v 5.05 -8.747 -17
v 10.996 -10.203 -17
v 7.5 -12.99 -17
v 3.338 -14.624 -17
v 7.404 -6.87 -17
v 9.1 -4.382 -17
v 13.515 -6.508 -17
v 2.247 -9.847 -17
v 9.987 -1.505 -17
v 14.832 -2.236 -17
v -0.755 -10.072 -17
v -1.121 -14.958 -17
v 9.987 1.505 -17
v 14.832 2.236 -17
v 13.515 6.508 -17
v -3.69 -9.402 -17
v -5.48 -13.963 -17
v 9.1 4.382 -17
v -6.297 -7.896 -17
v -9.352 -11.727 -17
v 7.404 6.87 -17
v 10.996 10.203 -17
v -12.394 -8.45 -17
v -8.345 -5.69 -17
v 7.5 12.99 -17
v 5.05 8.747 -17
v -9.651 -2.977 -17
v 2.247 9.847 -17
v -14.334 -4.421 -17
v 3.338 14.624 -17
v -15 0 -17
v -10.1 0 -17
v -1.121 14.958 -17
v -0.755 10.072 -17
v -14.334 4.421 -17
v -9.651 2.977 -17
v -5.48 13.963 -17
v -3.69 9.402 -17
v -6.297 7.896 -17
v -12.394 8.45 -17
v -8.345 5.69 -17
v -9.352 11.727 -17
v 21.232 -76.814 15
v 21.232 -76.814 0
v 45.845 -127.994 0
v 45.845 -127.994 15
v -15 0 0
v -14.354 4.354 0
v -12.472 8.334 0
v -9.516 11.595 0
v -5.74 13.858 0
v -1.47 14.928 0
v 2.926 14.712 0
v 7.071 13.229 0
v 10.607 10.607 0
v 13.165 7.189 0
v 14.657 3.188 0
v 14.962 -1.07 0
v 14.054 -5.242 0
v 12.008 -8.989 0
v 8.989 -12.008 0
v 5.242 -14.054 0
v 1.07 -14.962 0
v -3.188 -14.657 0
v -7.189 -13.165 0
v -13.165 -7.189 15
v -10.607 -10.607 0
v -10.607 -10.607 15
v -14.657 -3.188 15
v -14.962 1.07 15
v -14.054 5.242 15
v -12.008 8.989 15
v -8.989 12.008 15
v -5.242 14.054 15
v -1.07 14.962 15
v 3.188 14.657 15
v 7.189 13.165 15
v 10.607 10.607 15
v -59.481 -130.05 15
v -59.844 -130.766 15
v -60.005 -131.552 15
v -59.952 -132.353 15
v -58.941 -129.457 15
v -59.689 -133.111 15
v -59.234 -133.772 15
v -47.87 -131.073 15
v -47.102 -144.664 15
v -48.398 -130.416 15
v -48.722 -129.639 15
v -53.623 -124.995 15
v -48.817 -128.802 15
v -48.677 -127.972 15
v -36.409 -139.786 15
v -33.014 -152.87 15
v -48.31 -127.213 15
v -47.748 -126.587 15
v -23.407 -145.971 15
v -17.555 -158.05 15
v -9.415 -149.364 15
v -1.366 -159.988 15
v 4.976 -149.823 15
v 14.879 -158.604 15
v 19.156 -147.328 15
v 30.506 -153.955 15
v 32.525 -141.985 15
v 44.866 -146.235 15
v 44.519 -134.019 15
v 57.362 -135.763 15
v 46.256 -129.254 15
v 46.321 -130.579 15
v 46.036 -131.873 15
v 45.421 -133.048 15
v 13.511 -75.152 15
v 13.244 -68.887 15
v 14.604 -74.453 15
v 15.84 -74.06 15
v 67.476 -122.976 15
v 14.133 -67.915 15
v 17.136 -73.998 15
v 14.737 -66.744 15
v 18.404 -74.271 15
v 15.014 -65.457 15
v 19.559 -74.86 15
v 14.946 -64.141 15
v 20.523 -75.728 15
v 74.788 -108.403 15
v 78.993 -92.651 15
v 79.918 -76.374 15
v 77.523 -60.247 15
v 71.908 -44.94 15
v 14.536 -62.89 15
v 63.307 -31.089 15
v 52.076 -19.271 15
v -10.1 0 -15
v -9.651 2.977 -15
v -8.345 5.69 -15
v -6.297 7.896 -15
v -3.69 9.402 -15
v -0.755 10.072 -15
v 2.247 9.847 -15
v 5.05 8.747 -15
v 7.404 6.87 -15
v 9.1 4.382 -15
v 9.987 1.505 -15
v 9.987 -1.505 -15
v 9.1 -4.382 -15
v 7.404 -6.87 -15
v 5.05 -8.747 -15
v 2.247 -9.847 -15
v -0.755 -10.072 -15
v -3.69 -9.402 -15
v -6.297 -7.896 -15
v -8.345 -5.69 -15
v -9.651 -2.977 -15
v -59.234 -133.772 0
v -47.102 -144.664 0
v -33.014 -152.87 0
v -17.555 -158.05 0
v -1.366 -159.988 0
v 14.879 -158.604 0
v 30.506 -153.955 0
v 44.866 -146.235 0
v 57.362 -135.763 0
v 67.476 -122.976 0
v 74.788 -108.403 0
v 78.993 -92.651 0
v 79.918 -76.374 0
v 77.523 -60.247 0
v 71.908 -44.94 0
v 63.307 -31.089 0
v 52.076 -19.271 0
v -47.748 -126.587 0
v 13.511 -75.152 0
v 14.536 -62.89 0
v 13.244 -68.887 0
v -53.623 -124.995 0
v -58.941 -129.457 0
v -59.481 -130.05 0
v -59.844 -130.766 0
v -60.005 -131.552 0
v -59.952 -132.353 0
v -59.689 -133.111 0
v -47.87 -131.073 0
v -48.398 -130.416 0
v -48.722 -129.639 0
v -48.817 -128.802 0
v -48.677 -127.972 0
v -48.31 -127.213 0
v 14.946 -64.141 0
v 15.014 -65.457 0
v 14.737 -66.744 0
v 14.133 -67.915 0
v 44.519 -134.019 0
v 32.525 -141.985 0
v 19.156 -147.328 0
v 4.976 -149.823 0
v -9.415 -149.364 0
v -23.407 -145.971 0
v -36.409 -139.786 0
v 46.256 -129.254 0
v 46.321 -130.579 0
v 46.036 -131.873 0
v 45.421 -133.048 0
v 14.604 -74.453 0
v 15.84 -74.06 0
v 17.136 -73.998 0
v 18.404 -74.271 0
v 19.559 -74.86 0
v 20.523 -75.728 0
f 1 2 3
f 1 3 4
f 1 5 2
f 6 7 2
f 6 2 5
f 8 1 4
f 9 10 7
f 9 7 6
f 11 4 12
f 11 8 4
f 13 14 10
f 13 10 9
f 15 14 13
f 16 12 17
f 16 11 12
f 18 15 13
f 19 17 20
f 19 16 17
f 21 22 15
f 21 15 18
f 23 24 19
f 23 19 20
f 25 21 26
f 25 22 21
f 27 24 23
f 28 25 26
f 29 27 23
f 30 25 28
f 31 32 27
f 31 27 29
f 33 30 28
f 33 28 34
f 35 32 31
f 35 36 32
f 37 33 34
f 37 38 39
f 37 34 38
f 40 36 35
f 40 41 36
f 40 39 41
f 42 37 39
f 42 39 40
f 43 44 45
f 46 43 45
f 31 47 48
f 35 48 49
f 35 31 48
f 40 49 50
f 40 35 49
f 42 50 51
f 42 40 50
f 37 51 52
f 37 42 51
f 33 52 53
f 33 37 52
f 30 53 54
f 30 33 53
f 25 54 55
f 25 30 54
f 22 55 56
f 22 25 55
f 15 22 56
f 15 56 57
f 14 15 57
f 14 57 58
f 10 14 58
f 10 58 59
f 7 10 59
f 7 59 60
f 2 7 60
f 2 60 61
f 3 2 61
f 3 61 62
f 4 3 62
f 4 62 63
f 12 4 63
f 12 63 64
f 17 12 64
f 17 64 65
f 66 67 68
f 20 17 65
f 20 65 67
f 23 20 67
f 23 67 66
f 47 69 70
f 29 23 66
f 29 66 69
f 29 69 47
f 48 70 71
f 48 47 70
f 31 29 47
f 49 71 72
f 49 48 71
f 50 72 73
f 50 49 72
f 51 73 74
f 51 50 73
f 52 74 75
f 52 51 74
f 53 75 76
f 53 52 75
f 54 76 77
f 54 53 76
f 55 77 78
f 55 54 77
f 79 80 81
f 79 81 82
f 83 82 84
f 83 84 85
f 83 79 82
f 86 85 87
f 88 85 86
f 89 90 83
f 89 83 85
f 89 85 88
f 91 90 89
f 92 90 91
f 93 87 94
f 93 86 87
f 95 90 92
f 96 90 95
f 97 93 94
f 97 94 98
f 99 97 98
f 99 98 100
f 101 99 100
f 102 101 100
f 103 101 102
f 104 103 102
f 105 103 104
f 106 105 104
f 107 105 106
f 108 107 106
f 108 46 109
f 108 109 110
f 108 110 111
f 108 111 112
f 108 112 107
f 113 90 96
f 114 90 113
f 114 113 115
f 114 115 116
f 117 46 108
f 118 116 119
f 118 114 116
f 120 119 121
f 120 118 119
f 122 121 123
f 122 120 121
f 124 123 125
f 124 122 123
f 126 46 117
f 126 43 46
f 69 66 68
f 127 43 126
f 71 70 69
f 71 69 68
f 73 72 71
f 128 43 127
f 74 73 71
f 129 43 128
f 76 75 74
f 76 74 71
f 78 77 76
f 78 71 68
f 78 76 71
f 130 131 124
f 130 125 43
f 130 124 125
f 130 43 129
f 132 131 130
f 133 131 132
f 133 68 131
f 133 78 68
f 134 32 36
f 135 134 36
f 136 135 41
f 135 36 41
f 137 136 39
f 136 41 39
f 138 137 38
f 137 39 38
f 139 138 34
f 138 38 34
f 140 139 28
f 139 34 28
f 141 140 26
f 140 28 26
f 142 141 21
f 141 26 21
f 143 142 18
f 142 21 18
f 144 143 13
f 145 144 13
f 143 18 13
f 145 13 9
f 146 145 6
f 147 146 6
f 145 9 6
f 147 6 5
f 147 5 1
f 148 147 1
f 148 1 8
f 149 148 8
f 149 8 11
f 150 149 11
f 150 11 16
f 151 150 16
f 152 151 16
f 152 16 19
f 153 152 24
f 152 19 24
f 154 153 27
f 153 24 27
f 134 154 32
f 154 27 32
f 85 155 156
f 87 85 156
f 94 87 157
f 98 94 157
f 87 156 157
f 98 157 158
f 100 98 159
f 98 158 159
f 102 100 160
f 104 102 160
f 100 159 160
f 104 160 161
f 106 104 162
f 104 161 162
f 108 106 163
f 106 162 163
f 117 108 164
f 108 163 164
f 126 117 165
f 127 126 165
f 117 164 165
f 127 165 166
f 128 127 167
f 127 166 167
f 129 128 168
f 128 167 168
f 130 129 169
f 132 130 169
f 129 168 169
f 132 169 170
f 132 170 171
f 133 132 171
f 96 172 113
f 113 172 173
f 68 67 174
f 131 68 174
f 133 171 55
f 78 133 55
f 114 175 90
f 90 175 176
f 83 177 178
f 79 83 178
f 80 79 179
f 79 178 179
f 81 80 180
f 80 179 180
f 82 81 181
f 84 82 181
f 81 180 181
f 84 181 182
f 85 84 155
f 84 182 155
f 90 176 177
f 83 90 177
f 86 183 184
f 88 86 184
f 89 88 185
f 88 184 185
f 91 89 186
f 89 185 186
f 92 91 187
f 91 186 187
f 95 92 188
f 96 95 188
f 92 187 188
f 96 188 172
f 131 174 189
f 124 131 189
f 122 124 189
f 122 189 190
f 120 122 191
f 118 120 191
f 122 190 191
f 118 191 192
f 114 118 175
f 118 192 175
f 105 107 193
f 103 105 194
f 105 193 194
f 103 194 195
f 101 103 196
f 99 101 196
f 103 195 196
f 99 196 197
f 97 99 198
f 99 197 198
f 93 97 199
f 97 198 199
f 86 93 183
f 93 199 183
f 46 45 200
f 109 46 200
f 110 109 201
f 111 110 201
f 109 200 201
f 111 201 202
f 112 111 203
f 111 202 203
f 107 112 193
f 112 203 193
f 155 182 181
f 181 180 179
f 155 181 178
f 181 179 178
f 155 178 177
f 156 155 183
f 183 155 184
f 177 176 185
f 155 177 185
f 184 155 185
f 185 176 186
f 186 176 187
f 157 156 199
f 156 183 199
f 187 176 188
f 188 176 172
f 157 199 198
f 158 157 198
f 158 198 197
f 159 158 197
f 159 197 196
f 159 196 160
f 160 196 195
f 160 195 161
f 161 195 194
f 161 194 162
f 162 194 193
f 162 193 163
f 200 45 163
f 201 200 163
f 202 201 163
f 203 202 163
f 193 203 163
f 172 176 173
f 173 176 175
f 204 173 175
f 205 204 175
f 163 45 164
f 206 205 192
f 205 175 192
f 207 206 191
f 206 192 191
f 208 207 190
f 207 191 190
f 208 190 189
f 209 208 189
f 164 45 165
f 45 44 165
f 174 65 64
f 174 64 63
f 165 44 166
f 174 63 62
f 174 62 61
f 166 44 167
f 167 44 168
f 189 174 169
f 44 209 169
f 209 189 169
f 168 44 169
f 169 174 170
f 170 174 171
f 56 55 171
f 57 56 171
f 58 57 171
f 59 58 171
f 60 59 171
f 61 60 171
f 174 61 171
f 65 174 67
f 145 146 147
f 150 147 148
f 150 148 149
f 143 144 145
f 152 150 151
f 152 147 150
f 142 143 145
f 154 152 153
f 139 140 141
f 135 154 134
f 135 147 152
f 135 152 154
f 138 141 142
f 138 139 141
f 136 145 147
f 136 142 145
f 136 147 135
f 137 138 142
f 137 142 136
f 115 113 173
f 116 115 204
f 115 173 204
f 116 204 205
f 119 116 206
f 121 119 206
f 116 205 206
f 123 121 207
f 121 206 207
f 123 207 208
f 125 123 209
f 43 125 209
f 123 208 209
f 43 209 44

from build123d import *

# Parameters (mm, degrees)
EXTRUDE_1_DEPTH     = 15
EXTRUDE_START       = 17
SKETCH_9_R          = 15
EXTRUDE_3_DEPTH     = 17
SKETCH_10_R         = 10.1
CUT_EXTRUDE_4_DEPTH = 2


with BuildPart() as part:
    # ｽｹｯﾁ4 → ﾎﾞｽ - 押し出し1 (new body)
    with BuildSketch(Plane.XY):
        with BuildLine():
            Line((-53.623111018, -124.995132678), (-58.940636287, -129.45706617))
            ThreePointArc((-58.940636287, -129.45706617), (-60.005384698, -131.552012131), (-59.233530865, -133.771635843))
            ThreePointArc((-59.233530865, -133.771635843), (57.362306223, -135.763481103), (52.076178918, -19.270504783))
            Line((52.076178918, -19.270504783), (10.606601718, 10.606601718))
            ThreePointArc((10.606601718, 10.606601718), (-10.606601718, 10.606601718), (-10.606601718, -10.606601718))
            Line((-10.606601718, -10.606601718), (14.536280154, -62.889638219))
            ThreePointArc((14.536280154, -62.889638219), (14.918089499, -66.109676181), (13.244185189, -68.886809092))
            Line((13.244185189, -68.886809092), (-53.623111018, -124.995132678))
        make_face()
        with BuildLine():
            Line((21.232400696, -76.813798404), (45.844843506, -127.993820346))
            ThreePointArc((45.844843506, -127.993820346), (46.221944165, -131.235480845), (44.518718993, -134.019289696))
            ThreePointArc((44.518718993, -134.019289696), (-2.231208213, -149.964431749), (-47.870174388, -131.072951785))
            ThreePointArc((-47.870174388, -131.072951785), (-48.817477846, -128.802229421), (-47.747678417, -126.586582094))
            Line((-47.747678417, -126.586582094), (13.511229465, -75.151532228))
            ThreePointArc((13.511229465, -75.151532228), (17.77869109, -74.092739753), (21.232400696, -76.813798404))
        make_face(mode=Mode.SUBTRACT)
    extrude(amount=EXTRUDE_1_DEPTH)

    # ｽｹｯﾁ9 → ﾎﾞｽ - 押し出し3 (add)
    with BuildSketch(Plane(origin=(0, 0, 0), x_dir=(-1, 0, 0), z_dir=(0, 0, -1)).offset(EXTRUDE_START)):
        Circle(SKETCH_9_R)
    extrude(amount=-EXTRUDE_3_DEPTH)

    # ｽｹｯﾁ10 → ｶｯﾄ - 押し出し4 (cut)
    with BuildSketch(Plane(origin=(0, 0, -17), x_dir=(-1, 0, 0), z_dir=(0, 0, -1))):
        Circle(SKETCH_10_R)
    extrude(amount=-CUT_EXTRUDE_4_DEPTH, mode=Mode.SUBTRACT)


solid = part.part
